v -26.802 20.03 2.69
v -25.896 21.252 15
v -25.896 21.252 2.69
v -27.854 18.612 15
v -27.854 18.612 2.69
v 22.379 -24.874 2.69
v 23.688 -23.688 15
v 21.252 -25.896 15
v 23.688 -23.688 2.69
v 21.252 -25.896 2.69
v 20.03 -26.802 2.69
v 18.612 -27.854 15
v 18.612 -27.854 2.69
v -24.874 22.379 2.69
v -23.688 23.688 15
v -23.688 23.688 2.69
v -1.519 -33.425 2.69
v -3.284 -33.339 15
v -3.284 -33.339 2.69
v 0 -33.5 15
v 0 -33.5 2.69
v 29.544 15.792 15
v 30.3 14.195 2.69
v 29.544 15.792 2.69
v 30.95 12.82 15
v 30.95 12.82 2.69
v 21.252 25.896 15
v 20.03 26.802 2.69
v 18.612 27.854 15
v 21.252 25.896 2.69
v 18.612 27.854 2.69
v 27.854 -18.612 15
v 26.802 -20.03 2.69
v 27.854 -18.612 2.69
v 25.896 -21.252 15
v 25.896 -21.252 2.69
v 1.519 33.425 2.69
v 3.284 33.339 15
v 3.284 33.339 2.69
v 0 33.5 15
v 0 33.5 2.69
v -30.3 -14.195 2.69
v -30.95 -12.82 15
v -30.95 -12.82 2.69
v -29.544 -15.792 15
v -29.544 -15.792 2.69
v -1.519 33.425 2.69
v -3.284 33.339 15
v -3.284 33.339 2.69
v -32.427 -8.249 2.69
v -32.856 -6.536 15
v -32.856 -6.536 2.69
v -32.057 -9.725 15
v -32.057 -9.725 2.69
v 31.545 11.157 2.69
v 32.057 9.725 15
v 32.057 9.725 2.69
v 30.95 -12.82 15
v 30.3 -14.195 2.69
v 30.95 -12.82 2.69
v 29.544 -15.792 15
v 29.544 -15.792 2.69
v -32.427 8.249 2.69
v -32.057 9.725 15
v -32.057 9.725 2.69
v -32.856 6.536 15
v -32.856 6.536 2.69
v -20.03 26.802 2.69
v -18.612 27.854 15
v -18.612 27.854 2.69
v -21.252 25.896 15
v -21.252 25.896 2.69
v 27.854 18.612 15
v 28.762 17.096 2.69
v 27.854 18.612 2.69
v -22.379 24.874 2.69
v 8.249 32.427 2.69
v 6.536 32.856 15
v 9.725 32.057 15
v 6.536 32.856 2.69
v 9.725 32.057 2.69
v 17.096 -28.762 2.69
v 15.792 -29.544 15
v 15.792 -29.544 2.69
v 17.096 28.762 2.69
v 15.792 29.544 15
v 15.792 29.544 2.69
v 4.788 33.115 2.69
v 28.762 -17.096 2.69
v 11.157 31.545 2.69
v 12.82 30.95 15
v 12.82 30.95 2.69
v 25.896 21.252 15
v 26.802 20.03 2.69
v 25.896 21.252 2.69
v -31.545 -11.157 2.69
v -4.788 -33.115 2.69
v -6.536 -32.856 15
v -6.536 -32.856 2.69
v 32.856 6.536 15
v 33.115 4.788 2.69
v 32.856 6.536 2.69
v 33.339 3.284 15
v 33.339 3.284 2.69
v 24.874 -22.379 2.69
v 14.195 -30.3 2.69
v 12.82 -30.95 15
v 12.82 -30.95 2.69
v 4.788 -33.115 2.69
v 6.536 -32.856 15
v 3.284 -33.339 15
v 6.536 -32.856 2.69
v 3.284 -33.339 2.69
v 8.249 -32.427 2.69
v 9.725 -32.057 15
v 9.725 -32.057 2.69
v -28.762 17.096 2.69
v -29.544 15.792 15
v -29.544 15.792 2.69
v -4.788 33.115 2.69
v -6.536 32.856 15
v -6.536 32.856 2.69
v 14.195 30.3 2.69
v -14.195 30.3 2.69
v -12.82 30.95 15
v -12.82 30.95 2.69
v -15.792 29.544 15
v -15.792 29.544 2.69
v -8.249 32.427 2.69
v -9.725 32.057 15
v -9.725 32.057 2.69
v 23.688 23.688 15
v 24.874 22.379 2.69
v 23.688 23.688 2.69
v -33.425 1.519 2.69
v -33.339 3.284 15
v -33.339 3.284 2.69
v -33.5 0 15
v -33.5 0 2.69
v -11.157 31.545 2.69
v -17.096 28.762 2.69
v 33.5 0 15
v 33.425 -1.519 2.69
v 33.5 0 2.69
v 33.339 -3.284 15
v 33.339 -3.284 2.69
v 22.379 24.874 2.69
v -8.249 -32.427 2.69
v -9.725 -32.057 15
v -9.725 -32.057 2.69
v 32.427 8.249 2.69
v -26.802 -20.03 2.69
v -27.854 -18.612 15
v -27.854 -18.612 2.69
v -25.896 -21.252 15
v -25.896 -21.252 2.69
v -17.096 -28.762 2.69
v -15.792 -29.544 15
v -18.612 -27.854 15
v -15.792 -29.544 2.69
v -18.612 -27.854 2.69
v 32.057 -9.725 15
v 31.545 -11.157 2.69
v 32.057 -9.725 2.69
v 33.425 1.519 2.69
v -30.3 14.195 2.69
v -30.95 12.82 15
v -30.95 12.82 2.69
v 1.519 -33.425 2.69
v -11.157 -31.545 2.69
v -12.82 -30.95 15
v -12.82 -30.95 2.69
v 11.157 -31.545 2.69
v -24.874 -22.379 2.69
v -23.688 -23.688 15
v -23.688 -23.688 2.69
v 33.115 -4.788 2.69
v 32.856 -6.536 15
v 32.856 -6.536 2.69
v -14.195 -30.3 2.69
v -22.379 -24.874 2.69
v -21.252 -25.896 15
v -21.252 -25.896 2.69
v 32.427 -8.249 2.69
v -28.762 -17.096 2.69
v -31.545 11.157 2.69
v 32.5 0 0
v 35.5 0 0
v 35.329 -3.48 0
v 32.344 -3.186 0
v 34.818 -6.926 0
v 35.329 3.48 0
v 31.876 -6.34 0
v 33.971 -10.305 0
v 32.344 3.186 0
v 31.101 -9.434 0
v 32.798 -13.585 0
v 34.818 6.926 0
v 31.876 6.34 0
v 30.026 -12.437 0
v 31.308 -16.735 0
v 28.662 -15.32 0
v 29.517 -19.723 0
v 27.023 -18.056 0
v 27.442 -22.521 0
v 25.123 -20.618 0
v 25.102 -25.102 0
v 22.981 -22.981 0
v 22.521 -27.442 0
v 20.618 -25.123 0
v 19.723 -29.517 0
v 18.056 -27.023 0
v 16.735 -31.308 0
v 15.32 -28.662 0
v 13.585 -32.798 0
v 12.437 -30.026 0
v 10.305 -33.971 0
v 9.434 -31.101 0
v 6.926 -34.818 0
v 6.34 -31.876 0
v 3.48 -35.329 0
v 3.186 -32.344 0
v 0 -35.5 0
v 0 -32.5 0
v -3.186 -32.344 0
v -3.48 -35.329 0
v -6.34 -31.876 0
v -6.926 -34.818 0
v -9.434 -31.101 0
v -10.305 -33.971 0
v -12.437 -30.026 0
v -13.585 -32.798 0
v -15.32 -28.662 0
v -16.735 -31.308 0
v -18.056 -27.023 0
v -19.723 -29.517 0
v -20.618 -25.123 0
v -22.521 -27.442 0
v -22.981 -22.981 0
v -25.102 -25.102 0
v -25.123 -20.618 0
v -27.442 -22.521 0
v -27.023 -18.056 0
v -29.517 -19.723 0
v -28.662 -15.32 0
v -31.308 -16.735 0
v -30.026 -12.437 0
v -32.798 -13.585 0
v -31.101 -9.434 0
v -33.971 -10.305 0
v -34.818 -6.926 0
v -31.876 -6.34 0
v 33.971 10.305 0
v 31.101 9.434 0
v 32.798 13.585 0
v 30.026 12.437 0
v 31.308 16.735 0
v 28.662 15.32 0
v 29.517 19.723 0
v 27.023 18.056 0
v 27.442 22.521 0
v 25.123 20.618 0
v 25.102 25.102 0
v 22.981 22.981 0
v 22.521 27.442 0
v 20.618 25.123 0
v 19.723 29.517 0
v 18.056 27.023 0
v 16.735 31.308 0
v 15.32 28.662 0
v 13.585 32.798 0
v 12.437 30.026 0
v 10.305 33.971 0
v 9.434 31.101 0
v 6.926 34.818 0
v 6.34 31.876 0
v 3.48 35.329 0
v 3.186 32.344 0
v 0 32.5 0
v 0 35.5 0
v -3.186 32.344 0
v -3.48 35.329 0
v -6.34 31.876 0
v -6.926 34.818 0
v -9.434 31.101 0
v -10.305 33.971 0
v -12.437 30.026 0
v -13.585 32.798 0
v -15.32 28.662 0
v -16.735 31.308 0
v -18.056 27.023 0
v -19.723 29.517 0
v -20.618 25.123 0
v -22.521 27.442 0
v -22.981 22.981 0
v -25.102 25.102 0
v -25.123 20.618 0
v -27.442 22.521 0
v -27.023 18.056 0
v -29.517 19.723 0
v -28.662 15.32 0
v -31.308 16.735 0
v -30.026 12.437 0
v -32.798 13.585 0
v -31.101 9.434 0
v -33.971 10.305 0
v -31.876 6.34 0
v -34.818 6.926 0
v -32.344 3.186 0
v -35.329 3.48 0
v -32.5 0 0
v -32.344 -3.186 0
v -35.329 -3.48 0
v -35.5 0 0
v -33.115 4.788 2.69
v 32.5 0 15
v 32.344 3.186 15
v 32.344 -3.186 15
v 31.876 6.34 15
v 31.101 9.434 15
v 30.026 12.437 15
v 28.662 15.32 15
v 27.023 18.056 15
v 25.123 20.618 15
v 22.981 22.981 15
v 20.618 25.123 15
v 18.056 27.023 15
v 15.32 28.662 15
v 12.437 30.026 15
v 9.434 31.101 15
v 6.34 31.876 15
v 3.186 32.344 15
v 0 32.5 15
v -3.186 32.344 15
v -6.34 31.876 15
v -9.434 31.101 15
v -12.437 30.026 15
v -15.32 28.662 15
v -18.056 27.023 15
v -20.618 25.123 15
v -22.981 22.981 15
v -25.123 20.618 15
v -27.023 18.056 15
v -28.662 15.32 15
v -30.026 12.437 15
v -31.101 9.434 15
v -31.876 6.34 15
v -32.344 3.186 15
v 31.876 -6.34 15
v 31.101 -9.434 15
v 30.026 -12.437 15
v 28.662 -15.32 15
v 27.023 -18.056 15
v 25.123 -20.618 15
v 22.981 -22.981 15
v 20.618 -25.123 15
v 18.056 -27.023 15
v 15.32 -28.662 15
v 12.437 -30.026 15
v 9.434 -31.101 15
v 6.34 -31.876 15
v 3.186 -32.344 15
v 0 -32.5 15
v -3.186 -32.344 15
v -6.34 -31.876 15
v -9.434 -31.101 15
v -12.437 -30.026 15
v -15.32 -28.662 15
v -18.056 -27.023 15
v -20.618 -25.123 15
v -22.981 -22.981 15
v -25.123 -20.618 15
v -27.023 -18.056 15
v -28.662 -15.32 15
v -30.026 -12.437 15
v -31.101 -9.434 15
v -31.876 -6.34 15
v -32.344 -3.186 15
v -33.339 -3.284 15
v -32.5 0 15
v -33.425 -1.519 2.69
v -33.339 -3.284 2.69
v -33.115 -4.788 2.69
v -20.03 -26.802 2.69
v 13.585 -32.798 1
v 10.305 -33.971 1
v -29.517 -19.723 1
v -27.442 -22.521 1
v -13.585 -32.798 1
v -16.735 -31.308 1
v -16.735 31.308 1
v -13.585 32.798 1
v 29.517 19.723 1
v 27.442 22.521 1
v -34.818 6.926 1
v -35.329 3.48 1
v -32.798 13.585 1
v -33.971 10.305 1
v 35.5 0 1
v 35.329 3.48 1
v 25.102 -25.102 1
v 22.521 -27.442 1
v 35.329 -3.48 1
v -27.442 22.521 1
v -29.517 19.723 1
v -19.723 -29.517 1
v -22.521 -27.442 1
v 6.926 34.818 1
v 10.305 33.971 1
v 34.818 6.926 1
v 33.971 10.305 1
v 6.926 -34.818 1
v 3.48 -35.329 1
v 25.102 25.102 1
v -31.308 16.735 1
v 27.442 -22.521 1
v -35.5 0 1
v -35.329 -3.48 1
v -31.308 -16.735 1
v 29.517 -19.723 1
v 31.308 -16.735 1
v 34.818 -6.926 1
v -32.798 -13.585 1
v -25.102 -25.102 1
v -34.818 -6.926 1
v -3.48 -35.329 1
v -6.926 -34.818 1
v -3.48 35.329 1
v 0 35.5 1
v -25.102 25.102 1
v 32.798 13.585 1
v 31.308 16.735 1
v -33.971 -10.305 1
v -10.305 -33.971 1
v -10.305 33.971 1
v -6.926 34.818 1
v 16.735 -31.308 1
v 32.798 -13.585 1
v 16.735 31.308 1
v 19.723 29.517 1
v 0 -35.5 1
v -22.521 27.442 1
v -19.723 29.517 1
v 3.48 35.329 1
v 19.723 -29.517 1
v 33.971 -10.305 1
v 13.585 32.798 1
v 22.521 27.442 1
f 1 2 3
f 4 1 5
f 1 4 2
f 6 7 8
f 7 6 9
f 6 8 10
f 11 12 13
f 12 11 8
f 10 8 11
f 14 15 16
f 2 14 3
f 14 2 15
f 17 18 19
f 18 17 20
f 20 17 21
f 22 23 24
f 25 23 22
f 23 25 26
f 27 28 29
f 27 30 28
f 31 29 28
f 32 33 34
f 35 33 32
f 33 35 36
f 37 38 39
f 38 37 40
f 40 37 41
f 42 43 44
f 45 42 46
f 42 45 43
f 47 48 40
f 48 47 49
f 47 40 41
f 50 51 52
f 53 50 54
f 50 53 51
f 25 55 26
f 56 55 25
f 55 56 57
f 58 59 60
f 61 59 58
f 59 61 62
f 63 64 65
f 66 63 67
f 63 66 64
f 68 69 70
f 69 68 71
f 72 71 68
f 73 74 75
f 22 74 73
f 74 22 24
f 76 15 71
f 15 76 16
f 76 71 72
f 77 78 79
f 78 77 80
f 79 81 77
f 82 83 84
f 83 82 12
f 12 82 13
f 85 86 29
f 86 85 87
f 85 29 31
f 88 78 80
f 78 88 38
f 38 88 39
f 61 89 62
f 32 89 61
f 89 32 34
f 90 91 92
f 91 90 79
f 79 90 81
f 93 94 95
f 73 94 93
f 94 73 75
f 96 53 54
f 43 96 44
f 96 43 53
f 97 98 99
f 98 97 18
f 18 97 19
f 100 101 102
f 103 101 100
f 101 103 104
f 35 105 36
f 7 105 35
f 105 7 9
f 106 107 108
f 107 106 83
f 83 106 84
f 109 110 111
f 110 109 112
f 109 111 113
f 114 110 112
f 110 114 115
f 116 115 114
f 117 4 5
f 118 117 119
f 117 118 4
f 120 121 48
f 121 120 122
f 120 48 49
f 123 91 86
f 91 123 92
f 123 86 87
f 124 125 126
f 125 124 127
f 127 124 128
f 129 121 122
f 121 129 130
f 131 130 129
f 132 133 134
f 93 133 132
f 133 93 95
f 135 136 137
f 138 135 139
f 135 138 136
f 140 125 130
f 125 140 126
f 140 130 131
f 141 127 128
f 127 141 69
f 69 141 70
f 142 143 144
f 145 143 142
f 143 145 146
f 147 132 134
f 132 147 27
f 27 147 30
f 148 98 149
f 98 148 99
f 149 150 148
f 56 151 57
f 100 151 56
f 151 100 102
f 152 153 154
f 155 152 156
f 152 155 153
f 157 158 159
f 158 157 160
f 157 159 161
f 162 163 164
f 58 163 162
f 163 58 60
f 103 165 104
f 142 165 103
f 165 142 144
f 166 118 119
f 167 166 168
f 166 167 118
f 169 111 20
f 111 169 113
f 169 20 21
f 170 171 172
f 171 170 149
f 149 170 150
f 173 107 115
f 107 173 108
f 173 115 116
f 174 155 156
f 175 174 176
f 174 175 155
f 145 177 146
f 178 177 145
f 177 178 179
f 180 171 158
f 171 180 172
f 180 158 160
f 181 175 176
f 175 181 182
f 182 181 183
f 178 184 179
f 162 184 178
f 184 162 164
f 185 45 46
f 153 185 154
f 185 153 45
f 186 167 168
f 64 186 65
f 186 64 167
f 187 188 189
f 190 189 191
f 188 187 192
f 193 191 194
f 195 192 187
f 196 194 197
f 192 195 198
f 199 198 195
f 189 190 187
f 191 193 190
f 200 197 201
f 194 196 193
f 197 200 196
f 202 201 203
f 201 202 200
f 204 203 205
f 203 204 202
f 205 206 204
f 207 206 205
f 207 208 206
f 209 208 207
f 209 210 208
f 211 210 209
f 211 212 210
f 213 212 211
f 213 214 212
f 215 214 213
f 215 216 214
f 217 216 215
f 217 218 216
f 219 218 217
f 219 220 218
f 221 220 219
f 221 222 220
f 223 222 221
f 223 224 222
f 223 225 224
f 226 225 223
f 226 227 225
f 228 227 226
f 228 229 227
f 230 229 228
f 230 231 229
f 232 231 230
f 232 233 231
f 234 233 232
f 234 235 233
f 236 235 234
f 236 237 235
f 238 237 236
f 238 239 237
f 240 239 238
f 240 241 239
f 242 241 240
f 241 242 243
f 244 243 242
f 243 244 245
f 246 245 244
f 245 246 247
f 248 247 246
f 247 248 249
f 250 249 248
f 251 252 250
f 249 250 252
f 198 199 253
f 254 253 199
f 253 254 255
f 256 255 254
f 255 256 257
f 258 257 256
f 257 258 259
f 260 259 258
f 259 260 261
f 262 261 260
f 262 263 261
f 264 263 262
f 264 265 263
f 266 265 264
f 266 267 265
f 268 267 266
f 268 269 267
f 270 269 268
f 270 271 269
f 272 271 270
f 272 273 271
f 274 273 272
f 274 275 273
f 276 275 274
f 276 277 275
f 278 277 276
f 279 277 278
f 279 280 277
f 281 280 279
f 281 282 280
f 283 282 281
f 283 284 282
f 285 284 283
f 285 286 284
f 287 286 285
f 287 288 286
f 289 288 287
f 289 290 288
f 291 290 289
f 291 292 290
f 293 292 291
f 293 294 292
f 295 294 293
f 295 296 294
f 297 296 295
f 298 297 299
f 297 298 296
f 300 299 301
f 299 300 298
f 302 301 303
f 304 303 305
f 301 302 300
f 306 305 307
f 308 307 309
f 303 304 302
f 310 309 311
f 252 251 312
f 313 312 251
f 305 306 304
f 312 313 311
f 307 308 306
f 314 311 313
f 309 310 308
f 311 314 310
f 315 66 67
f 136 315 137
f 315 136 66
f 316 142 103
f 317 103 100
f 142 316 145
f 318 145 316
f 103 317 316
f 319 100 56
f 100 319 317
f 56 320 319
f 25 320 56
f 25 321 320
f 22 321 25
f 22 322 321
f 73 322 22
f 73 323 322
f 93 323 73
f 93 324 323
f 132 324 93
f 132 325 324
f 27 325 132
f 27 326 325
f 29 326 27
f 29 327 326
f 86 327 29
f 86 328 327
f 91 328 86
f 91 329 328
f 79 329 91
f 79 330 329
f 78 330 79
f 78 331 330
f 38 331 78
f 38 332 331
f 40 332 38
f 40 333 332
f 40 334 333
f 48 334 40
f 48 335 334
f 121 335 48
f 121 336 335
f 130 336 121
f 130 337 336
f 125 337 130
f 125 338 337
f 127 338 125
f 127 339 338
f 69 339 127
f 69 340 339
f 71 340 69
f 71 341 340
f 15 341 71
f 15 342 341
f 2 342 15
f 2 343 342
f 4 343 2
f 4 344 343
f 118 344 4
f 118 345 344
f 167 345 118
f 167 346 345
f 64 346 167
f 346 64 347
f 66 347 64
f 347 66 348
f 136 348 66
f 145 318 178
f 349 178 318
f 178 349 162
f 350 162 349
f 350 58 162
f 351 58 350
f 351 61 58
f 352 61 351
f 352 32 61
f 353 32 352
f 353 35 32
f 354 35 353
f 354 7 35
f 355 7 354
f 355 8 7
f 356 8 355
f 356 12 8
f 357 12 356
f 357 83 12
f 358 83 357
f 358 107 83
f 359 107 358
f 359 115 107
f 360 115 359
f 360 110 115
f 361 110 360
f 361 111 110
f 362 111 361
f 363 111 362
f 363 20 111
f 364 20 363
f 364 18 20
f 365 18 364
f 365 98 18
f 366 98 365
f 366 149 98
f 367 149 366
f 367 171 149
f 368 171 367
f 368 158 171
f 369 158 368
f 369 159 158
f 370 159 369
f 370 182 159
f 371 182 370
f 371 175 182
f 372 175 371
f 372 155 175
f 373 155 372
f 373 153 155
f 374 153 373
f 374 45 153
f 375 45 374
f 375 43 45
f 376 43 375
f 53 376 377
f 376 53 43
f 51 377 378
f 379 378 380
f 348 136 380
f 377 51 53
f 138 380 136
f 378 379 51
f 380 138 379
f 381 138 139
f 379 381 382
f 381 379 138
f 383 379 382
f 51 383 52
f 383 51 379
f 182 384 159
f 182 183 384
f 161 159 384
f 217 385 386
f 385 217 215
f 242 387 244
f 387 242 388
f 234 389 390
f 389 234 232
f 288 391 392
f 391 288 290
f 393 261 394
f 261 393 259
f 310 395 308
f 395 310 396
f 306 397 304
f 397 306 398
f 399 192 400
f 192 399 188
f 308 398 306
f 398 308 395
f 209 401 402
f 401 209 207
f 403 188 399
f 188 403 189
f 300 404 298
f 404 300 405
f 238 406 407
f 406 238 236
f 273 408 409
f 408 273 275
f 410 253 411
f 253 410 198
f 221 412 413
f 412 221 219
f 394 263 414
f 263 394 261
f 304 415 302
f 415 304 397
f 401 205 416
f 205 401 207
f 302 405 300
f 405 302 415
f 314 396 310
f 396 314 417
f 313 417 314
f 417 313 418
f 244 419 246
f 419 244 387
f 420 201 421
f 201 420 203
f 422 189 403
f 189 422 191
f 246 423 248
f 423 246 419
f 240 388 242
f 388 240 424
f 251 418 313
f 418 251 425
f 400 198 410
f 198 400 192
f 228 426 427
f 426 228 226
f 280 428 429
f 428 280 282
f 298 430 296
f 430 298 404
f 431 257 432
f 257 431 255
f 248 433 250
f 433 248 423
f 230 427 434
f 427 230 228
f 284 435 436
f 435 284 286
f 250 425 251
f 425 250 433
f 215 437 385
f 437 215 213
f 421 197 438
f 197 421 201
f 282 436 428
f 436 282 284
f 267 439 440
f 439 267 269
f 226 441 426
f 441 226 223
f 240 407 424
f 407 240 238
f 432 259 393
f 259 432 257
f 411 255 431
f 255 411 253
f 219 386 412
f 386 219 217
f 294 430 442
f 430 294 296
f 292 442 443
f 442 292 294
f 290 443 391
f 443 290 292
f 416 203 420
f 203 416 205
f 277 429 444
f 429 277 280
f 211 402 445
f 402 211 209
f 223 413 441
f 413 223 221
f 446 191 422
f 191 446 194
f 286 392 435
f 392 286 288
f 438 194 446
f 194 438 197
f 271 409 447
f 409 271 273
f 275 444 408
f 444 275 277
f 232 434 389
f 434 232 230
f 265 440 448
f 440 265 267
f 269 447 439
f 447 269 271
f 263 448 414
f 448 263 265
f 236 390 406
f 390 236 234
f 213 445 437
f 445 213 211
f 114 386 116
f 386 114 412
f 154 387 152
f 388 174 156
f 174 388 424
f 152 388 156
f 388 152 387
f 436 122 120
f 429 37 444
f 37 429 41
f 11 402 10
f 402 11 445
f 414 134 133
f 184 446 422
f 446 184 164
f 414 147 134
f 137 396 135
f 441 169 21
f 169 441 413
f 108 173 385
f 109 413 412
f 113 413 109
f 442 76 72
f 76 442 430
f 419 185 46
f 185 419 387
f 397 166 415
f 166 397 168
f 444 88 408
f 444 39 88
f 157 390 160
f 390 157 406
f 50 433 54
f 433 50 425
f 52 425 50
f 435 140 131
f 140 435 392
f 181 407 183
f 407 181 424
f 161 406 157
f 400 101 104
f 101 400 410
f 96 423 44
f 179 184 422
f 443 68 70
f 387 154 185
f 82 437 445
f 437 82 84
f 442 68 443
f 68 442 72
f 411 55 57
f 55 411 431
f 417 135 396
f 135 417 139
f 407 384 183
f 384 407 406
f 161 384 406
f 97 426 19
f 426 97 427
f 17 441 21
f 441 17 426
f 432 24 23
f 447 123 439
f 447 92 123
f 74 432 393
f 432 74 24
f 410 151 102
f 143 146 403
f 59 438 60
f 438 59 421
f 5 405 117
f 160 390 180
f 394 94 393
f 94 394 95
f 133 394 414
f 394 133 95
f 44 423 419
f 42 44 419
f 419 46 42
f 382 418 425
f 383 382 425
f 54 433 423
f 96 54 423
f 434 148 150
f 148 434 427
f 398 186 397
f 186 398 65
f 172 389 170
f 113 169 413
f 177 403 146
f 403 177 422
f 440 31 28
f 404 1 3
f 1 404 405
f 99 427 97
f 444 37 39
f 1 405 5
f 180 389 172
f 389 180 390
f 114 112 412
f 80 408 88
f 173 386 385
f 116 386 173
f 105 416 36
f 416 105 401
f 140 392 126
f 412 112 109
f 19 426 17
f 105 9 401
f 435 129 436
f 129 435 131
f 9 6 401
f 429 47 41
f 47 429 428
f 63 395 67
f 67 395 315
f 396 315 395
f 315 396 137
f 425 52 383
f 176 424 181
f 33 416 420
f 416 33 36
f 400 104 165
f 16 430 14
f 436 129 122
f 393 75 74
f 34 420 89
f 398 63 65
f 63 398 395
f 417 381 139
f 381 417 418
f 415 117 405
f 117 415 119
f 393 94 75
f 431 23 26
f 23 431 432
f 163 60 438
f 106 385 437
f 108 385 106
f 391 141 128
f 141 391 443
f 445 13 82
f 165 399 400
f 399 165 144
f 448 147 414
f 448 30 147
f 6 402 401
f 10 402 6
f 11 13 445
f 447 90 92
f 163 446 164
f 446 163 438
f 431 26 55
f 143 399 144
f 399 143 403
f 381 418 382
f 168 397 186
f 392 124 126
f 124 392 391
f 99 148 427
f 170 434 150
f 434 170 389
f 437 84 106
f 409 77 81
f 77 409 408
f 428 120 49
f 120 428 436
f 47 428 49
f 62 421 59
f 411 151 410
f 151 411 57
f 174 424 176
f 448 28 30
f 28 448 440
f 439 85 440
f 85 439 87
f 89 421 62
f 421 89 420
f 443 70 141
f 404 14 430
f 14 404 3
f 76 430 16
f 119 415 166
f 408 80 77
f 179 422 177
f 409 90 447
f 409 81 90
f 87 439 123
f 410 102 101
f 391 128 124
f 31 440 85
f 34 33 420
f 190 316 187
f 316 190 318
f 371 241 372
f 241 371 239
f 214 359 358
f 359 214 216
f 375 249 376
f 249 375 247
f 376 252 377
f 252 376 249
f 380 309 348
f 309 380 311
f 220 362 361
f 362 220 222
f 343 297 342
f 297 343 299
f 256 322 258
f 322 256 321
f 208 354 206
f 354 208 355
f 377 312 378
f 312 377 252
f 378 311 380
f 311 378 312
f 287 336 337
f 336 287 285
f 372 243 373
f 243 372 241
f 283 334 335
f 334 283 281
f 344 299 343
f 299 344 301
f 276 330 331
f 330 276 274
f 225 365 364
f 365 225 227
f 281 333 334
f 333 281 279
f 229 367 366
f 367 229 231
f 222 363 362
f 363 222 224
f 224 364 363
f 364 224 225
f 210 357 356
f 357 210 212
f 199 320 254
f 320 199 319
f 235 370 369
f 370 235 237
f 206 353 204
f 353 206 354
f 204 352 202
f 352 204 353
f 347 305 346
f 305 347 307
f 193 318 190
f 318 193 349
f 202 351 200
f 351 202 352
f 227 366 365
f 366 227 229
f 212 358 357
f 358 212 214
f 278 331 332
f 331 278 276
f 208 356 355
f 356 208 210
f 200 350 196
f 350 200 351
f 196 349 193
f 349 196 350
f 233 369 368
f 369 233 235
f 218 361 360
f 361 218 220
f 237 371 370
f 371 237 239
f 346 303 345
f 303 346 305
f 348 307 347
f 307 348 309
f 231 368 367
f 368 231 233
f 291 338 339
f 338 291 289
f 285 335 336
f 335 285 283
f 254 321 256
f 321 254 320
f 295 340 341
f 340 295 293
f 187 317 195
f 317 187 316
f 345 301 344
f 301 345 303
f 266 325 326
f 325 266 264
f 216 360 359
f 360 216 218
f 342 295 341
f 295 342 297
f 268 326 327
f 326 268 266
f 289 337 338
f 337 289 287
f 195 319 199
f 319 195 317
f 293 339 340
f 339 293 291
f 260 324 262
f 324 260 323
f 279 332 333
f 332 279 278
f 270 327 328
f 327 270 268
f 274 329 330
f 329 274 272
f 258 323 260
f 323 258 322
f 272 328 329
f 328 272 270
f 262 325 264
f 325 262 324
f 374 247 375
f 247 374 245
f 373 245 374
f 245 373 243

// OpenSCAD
//
// Plain circle-shaped cookie cutter
//

$r  = 32.5; // radius of the circle
$h  = 15; // total height of the cutter
$w  =  1; // wall thickness
$fw =  3; // foot wall thickness
$fh =  1; // foot height
eps = 0.01;

$fn=64;

module makeCookieCutter() {

    difference() {
        union() {
            linear_extrude( height=$h ) {
                minkowski() {
                    children();
                    circle( r=$w );
                }
            }
            linear_extrude( height=$fh ) {
                minkowski() {
                    children();
                    circle( r=$fw );
                }
            }
            // This makes the thing easier to clean
            translate( [0, 0, $fh ] ) {
                linear_extrude( height=$fh*3, scale=0.9 ) {
                    minkowski() {
                        children();
                        circle( r=$fw );
                    }
                }
            }
        }
        translate([0, 0, -eps])
        linear_extrude( height=$h+2*eps ) {
            children();
        }
    }
}

makeCookieCutter() {
    circle( r=$r );
}
